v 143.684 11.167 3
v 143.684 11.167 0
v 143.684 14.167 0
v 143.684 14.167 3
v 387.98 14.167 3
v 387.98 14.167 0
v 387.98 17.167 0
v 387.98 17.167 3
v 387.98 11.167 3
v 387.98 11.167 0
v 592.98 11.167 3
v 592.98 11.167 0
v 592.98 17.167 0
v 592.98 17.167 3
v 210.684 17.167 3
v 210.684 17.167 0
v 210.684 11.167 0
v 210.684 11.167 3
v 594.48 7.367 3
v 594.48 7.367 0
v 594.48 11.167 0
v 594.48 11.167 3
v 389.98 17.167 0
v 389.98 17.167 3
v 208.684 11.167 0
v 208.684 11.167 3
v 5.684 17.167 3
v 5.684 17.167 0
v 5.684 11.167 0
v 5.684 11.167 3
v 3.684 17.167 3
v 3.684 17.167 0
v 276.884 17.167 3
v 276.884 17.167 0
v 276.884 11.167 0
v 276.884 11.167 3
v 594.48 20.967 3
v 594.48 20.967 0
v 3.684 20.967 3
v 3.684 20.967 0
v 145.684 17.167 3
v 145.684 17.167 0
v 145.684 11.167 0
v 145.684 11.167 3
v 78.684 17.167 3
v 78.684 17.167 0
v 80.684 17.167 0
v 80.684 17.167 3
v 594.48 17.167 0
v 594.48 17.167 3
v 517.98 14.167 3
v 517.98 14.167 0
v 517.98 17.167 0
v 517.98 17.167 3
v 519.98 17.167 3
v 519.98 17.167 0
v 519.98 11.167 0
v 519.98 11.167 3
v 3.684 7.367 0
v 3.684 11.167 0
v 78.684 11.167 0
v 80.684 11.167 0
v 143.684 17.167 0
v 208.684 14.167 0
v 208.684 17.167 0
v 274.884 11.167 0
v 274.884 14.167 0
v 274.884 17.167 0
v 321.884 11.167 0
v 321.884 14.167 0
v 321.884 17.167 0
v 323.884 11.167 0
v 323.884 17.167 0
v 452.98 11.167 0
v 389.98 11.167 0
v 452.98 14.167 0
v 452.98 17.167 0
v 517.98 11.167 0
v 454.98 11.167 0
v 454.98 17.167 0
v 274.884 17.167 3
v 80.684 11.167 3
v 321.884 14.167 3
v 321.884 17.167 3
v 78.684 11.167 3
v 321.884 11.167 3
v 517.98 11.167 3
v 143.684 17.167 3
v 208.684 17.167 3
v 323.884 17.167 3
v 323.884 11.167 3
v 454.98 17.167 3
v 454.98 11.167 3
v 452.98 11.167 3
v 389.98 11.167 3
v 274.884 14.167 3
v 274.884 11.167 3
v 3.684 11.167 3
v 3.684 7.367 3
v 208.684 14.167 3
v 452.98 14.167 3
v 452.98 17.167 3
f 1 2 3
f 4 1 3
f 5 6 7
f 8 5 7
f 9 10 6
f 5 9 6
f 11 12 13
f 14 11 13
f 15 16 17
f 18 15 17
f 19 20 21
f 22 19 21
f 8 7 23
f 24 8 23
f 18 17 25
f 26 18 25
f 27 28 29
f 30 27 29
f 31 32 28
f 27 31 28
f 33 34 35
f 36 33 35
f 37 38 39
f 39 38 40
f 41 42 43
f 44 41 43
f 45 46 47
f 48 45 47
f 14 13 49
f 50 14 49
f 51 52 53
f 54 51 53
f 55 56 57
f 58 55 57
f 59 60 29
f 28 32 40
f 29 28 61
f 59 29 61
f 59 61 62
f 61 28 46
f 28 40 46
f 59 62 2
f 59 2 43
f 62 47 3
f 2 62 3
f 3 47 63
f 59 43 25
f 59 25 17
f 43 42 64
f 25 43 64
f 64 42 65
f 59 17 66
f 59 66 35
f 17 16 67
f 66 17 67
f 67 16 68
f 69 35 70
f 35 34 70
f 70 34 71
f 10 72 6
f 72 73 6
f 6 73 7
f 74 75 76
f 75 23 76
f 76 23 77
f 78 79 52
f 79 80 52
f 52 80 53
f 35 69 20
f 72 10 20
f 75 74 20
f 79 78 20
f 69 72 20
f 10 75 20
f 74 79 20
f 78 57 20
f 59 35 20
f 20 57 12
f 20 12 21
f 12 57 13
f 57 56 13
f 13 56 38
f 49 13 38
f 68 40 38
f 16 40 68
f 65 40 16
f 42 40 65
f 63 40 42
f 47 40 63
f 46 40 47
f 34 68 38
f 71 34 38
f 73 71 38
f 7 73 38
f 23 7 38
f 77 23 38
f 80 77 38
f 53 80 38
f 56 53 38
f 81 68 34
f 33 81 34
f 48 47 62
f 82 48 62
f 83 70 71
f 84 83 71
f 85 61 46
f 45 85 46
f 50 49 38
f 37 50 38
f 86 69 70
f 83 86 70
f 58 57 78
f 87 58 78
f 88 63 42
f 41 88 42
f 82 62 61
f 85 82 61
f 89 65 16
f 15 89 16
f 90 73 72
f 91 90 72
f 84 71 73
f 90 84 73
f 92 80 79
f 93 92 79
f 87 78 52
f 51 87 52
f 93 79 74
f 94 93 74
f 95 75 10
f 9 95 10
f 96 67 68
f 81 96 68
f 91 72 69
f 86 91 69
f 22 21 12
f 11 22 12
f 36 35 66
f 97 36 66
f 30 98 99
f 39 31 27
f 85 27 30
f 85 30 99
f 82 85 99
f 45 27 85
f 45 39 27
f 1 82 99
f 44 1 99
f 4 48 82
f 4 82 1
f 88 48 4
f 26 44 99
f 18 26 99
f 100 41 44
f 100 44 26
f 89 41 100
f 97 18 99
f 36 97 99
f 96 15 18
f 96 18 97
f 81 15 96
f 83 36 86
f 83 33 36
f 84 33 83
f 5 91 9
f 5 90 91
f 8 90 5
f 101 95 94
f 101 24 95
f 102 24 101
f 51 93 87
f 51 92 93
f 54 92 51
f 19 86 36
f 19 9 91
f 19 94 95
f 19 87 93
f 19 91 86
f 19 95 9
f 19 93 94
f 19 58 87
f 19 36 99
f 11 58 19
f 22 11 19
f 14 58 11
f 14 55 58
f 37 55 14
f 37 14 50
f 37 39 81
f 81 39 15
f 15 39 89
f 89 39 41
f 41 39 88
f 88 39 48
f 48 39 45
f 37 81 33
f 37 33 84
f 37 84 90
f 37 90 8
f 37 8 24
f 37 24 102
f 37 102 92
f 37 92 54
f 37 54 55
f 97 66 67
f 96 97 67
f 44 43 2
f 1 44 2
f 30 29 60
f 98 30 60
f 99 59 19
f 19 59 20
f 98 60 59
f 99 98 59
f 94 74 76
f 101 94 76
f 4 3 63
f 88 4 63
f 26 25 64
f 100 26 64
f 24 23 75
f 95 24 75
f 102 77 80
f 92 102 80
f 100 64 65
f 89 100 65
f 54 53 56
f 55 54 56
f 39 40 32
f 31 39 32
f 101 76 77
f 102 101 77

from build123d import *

# Parameters (mm, degrees)
EXTRUDE_1_DEPTH = 3


with BuildPart() as part:
    # Model → 凸台-拉伸1 (new body)
    with BuildSketch(Plane.XY):
        Polygon((594.4798768, 20.966777044), (3.683638592, 20.966777044), (3.683638592, 17.166777044), (5.683638592, 17.166777044), (5.683638592, 11.166777044), (3.683638592, 11.166777044), (3.683638592, 7.366777044), (594.4798768, 7.366777044), (594.4798768, 11.166777044), (592.9798768, 11.166777044), (592.9798768, 17.166777044), (594.4798768, 17.166777044), align=None)
        Polygon((78.683615423, 14.166777044), (78.683615423, 17.166777044), (80.683615423, 17.166777044), (80.683615423, 11.166777044), (78.683615423, 11.166777044), align=None, mode=Mode.SUBTRACT)
        Polygon((143.683592254, 14.166777044), (143.68359107, 17.166782765), (145.68359107, 17.166782765), (145.68359107, 11.166782765), (143.68359107, 11.166782765), align=None, mode=Mode.SUBTRACT)
        Polygon((208.683569086, 14.166777044), (208.683567901, 17.166782765), (210.683567901, 17.166782765), (210.683567901, 11.166782765), (208.683567901, 11.166782765), align=None, mode=Mode.SUBTRACT)
        Polygon((274.88354608, 14.166781952), (274.883544895, 17.166787672), (276.883544895, 17.166787672), (276.883544895, 11.166787672), (274.883544895, 11.166787672), align=None, mode=Mode.SUBTRACT)
        Polygon((321.883556192, 14.166781952), (321.883555007, 17.166787672), (323.883555007, 17.166787672), (323.883555007, 11.166787672), (321.883555007, 11.166787672), align=None, mode=Mode.SUBTRACT)
        Polygon((387.9799484, 14.166781952), (387.979947216, 17.166787672), (389.979947216, 17.166787672), (389.979947216, 11.166787672), (387.979947216, 11.166787672), align=None, mode=Mode.SUBTRACT)
        Polygon((452.979925232, 14.166781952), (452.979924047, 17.166787672), (454.979924047, 17.166787672), (454.979924047, 11.166787672), (452.979924047, 11.166787672), align=None, mode=Mode.SUBTRACT)
        Polygon((517.979902063, 14.166781952), (517.979900879, 17.166787672), (519.979900879, 17.166787672), (519.979900879, 11.166787672), (517.979900879, 11.166787672), align=None, mode=Mode.SUBTRACT)
    extrude(amount=EXTRUDE_1_DEPTH)


solid = part.part
